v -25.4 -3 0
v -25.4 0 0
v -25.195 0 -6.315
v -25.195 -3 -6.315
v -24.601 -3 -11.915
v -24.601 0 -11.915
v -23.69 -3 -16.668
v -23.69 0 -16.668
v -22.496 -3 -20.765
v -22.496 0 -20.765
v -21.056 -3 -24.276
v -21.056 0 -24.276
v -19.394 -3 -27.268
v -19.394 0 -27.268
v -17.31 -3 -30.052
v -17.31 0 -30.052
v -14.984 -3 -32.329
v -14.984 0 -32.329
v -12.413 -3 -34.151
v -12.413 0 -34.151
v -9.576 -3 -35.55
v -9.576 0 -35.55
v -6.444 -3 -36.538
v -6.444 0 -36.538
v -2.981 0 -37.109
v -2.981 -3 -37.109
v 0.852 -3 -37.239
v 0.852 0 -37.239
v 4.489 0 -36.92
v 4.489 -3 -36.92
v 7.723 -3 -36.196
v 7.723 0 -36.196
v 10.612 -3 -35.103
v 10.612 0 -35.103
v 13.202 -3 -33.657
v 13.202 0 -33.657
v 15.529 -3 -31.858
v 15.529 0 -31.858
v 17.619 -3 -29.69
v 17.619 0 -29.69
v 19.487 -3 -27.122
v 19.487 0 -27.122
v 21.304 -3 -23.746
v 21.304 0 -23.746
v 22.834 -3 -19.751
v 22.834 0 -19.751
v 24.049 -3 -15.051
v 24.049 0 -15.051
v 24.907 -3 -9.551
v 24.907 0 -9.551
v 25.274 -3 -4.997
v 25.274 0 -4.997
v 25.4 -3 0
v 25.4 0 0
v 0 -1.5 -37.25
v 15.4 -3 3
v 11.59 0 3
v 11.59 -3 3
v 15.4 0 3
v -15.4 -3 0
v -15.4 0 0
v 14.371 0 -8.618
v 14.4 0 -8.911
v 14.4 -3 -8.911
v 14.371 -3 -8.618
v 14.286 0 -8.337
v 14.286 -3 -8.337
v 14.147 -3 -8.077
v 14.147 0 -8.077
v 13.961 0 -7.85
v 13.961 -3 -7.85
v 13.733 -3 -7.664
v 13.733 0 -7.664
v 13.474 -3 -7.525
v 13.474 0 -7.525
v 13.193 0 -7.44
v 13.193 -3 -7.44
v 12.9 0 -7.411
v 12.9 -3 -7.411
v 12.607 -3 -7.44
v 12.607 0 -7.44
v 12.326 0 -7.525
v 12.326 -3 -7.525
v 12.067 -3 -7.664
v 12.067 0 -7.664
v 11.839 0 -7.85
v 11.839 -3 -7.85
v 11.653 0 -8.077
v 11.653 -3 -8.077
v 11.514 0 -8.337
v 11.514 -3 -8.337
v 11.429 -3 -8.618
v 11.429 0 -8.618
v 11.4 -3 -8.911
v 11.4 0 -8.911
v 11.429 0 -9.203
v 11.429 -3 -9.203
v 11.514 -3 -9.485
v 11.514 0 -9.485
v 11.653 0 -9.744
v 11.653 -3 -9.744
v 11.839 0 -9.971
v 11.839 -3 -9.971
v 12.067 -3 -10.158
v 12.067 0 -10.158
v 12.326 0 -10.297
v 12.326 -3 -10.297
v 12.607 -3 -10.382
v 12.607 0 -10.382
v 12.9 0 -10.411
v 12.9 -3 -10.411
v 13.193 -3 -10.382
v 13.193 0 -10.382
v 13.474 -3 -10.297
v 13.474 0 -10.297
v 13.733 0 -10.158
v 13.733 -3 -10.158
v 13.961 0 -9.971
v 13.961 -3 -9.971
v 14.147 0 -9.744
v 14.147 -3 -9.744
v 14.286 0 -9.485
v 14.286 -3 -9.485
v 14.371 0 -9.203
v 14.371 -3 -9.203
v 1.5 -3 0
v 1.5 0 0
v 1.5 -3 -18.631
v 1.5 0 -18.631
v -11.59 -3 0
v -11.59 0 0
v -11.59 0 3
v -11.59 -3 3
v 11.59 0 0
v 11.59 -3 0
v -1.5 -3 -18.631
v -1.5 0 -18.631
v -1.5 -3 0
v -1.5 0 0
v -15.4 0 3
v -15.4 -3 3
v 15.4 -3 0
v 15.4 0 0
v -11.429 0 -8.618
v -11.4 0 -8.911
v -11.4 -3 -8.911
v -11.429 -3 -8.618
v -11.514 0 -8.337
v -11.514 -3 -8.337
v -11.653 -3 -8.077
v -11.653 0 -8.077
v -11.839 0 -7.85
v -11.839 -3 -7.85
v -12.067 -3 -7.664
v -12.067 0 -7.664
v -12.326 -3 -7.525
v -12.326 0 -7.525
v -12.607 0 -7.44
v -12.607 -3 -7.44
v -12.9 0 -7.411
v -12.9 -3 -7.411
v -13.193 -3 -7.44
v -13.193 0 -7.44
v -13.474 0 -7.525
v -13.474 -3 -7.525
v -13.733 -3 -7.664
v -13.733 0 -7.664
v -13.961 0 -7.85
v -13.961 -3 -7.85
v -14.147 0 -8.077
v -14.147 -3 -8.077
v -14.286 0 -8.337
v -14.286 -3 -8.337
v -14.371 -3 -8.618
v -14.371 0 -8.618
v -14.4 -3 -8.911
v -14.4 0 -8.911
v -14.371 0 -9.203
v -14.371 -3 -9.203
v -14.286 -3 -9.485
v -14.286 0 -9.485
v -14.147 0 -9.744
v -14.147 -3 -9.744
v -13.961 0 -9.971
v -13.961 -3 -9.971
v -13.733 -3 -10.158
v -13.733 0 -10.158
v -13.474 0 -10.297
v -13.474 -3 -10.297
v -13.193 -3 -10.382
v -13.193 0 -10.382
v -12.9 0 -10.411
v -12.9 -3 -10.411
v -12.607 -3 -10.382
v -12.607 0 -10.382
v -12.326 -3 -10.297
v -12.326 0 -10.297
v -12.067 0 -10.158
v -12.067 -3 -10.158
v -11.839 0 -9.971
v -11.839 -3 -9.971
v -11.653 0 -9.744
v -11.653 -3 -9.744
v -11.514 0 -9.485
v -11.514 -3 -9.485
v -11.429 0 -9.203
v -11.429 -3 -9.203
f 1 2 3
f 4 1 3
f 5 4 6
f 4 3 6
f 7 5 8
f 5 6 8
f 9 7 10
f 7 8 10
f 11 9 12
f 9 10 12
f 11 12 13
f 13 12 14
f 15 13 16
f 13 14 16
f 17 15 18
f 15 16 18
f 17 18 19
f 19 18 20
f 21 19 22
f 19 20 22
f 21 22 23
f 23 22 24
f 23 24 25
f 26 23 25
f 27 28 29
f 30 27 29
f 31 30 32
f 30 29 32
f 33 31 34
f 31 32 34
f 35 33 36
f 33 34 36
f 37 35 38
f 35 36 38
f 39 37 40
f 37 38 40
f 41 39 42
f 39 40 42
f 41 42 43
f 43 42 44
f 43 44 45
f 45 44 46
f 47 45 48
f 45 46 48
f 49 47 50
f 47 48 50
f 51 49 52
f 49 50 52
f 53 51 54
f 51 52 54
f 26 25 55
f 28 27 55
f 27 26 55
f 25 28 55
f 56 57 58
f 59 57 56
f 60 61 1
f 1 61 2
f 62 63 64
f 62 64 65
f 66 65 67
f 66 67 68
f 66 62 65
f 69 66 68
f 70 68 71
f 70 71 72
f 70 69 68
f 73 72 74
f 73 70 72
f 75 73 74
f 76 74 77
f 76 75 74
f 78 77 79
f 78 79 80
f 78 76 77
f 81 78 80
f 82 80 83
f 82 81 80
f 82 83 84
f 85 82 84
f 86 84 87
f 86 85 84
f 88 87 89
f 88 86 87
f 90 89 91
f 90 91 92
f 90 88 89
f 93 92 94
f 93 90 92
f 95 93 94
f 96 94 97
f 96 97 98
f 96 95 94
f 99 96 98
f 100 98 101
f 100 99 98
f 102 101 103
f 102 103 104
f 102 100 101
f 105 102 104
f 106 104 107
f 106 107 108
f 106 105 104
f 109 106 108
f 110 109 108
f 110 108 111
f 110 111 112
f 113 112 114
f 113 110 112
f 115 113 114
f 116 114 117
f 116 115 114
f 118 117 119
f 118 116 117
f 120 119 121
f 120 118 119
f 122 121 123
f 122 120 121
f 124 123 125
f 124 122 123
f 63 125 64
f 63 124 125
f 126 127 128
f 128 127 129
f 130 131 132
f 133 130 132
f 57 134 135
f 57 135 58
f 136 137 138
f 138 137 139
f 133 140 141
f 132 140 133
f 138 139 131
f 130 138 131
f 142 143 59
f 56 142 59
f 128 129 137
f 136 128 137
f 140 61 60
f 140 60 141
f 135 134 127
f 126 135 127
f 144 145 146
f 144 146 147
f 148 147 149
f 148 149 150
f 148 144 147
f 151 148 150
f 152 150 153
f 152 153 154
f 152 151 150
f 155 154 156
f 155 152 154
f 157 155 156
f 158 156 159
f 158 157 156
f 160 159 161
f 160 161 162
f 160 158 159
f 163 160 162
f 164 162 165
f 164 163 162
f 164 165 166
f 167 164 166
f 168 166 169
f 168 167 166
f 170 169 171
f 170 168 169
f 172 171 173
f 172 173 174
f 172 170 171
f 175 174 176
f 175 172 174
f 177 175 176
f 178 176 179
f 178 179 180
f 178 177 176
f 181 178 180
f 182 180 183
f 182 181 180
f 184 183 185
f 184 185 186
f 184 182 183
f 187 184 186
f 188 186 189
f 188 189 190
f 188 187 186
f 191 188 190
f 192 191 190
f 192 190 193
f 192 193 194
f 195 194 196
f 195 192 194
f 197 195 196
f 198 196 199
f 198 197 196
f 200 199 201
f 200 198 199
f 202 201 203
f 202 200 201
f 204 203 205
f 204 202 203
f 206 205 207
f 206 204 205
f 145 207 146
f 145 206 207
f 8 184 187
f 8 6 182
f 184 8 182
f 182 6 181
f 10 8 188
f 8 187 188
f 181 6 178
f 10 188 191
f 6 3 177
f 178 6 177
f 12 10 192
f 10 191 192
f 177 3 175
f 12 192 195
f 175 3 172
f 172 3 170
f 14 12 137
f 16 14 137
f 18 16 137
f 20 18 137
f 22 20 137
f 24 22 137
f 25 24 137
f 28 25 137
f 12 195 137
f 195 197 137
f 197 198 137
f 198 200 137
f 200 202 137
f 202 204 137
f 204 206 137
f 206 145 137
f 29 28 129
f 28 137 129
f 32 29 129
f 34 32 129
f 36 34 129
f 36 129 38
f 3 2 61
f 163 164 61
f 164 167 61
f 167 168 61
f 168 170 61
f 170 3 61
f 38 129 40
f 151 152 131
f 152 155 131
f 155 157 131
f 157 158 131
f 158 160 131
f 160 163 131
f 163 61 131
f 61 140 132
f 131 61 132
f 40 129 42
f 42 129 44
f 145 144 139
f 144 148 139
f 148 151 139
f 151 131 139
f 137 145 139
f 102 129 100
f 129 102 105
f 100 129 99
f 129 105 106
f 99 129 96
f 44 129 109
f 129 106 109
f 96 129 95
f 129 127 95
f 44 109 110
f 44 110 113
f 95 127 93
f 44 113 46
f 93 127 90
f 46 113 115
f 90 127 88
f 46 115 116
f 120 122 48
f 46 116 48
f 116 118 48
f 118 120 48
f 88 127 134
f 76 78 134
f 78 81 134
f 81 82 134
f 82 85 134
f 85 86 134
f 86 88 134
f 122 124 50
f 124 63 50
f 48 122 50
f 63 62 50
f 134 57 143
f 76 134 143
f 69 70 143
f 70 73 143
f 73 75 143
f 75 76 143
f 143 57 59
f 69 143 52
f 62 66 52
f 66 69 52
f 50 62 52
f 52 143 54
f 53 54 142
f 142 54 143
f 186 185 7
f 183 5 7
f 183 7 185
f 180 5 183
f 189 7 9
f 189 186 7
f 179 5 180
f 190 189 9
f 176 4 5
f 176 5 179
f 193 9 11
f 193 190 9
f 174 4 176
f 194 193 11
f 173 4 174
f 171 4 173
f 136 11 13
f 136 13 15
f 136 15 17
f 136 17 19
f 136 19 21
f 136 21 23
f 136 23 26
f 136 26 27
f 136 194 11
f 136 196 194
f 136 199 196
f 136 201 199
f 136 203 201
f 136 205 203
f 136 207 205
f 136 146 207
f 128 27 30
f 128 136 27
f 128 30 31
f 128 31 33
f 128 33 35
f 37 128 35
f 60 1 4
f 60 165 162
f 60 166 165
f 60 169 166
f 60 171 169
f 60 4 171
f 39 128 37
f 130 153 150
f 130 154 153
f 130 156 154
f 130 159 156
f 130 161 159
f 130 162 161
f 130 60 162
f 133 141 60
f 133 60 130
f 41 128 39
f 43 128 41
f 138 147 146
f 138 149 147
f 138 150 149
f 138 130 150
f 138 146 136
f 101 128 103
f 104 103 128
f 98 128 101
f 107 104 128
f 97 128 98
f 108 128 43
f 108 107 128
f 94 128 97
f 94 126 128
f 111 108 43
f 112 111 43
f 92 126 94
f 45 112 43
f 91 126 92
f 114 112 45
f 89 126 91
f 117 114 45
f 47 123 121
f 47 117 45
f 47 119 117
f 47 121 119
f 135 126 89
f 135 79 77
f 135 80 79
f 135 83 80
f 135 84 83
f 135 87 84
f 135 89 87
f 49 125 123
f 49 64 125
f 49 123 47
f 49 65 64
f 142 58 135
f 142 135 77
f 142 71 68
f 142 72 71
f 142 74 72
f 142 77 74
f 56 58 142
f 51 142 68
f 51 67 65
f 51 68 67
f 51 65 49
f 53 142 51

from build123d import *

# Parameters (mm, degrees)
F0_R     = 1.5
F0_W     = 3.81
F0_H     = 3
F1_DEPTH = 3


# Not quite as in the source:
# - a feature names something its author has since deleted; it is built from what else it names


with BuildPart() as f1:
    # F0 (on Front) → F1 (new body)
    with BuildSketch(Plane.XZ):
        with BuildLine():
            Line((-1.5, -18.6309), (-1.5, 0))
            Line((-1.5, 0), (-7.59, 0))
            Line((-7.59, 0), (-11.59, 0))
            Line((-11.59, 0), (-15.4, 0))
            Line((-15.4, 0), (-17.05, 0))
            Line((-17.05, 0), (-25.4, 0))
            add(Edge.make_bspline(
                [(-25.4, 0), (-25.4, -30), (-12.7, -37.25), (0, -37.25)],
                knots=[0, 0, 0, 0, 0.5, 0.5, 0.5, 0.5], degree=3))
            Line((0, -37.25), (0, -18.6309))
            Line((0, -18.6309), (-1.5, -18.6309))
        make_face()
        with Locations((-12.9, -8.9107090607)):
            Circle(F0_R, mode=Mode.SUBTRACT)
        with BuildLine():
            Line((4.35, 0), (1.5, 0))
            Line((1.5, 0), (1.5, -18.6309))
            Line((1.5, -18.6309), (0, -18.6309))
            Line((0, -18.6309), (0, -37.25))
            add(Edge.make_bspline(
                [(0, -37.25), (12.7, -37.25), (25.4, -30), (25.4, 0)],
                knots=[0.5, 0.5, 0.5, 0.5, 1, 1, 1, 1], degree=3))
            Line((25.4, 0), (15.4, 0))
            Line((15.4, 0), (11.59, 0))
            Line((11.59, 0), (6.35, 0))
            Line((6.35, 0), (4.35, 0))
        make_face()
        with Locations((12.9, -8.9107090607)):
            Circle(F0_R, mode=Mode.SUBTRACT)
        with Locations((13.495, 1.5)):
            Rectangle(F0_W, F0_H)
        with Locations((-13.495, 1.5)):
            Rectangle(F0_W, F0_H)
    extrude(amount=F1_DEPTH)


solid = f1.part
